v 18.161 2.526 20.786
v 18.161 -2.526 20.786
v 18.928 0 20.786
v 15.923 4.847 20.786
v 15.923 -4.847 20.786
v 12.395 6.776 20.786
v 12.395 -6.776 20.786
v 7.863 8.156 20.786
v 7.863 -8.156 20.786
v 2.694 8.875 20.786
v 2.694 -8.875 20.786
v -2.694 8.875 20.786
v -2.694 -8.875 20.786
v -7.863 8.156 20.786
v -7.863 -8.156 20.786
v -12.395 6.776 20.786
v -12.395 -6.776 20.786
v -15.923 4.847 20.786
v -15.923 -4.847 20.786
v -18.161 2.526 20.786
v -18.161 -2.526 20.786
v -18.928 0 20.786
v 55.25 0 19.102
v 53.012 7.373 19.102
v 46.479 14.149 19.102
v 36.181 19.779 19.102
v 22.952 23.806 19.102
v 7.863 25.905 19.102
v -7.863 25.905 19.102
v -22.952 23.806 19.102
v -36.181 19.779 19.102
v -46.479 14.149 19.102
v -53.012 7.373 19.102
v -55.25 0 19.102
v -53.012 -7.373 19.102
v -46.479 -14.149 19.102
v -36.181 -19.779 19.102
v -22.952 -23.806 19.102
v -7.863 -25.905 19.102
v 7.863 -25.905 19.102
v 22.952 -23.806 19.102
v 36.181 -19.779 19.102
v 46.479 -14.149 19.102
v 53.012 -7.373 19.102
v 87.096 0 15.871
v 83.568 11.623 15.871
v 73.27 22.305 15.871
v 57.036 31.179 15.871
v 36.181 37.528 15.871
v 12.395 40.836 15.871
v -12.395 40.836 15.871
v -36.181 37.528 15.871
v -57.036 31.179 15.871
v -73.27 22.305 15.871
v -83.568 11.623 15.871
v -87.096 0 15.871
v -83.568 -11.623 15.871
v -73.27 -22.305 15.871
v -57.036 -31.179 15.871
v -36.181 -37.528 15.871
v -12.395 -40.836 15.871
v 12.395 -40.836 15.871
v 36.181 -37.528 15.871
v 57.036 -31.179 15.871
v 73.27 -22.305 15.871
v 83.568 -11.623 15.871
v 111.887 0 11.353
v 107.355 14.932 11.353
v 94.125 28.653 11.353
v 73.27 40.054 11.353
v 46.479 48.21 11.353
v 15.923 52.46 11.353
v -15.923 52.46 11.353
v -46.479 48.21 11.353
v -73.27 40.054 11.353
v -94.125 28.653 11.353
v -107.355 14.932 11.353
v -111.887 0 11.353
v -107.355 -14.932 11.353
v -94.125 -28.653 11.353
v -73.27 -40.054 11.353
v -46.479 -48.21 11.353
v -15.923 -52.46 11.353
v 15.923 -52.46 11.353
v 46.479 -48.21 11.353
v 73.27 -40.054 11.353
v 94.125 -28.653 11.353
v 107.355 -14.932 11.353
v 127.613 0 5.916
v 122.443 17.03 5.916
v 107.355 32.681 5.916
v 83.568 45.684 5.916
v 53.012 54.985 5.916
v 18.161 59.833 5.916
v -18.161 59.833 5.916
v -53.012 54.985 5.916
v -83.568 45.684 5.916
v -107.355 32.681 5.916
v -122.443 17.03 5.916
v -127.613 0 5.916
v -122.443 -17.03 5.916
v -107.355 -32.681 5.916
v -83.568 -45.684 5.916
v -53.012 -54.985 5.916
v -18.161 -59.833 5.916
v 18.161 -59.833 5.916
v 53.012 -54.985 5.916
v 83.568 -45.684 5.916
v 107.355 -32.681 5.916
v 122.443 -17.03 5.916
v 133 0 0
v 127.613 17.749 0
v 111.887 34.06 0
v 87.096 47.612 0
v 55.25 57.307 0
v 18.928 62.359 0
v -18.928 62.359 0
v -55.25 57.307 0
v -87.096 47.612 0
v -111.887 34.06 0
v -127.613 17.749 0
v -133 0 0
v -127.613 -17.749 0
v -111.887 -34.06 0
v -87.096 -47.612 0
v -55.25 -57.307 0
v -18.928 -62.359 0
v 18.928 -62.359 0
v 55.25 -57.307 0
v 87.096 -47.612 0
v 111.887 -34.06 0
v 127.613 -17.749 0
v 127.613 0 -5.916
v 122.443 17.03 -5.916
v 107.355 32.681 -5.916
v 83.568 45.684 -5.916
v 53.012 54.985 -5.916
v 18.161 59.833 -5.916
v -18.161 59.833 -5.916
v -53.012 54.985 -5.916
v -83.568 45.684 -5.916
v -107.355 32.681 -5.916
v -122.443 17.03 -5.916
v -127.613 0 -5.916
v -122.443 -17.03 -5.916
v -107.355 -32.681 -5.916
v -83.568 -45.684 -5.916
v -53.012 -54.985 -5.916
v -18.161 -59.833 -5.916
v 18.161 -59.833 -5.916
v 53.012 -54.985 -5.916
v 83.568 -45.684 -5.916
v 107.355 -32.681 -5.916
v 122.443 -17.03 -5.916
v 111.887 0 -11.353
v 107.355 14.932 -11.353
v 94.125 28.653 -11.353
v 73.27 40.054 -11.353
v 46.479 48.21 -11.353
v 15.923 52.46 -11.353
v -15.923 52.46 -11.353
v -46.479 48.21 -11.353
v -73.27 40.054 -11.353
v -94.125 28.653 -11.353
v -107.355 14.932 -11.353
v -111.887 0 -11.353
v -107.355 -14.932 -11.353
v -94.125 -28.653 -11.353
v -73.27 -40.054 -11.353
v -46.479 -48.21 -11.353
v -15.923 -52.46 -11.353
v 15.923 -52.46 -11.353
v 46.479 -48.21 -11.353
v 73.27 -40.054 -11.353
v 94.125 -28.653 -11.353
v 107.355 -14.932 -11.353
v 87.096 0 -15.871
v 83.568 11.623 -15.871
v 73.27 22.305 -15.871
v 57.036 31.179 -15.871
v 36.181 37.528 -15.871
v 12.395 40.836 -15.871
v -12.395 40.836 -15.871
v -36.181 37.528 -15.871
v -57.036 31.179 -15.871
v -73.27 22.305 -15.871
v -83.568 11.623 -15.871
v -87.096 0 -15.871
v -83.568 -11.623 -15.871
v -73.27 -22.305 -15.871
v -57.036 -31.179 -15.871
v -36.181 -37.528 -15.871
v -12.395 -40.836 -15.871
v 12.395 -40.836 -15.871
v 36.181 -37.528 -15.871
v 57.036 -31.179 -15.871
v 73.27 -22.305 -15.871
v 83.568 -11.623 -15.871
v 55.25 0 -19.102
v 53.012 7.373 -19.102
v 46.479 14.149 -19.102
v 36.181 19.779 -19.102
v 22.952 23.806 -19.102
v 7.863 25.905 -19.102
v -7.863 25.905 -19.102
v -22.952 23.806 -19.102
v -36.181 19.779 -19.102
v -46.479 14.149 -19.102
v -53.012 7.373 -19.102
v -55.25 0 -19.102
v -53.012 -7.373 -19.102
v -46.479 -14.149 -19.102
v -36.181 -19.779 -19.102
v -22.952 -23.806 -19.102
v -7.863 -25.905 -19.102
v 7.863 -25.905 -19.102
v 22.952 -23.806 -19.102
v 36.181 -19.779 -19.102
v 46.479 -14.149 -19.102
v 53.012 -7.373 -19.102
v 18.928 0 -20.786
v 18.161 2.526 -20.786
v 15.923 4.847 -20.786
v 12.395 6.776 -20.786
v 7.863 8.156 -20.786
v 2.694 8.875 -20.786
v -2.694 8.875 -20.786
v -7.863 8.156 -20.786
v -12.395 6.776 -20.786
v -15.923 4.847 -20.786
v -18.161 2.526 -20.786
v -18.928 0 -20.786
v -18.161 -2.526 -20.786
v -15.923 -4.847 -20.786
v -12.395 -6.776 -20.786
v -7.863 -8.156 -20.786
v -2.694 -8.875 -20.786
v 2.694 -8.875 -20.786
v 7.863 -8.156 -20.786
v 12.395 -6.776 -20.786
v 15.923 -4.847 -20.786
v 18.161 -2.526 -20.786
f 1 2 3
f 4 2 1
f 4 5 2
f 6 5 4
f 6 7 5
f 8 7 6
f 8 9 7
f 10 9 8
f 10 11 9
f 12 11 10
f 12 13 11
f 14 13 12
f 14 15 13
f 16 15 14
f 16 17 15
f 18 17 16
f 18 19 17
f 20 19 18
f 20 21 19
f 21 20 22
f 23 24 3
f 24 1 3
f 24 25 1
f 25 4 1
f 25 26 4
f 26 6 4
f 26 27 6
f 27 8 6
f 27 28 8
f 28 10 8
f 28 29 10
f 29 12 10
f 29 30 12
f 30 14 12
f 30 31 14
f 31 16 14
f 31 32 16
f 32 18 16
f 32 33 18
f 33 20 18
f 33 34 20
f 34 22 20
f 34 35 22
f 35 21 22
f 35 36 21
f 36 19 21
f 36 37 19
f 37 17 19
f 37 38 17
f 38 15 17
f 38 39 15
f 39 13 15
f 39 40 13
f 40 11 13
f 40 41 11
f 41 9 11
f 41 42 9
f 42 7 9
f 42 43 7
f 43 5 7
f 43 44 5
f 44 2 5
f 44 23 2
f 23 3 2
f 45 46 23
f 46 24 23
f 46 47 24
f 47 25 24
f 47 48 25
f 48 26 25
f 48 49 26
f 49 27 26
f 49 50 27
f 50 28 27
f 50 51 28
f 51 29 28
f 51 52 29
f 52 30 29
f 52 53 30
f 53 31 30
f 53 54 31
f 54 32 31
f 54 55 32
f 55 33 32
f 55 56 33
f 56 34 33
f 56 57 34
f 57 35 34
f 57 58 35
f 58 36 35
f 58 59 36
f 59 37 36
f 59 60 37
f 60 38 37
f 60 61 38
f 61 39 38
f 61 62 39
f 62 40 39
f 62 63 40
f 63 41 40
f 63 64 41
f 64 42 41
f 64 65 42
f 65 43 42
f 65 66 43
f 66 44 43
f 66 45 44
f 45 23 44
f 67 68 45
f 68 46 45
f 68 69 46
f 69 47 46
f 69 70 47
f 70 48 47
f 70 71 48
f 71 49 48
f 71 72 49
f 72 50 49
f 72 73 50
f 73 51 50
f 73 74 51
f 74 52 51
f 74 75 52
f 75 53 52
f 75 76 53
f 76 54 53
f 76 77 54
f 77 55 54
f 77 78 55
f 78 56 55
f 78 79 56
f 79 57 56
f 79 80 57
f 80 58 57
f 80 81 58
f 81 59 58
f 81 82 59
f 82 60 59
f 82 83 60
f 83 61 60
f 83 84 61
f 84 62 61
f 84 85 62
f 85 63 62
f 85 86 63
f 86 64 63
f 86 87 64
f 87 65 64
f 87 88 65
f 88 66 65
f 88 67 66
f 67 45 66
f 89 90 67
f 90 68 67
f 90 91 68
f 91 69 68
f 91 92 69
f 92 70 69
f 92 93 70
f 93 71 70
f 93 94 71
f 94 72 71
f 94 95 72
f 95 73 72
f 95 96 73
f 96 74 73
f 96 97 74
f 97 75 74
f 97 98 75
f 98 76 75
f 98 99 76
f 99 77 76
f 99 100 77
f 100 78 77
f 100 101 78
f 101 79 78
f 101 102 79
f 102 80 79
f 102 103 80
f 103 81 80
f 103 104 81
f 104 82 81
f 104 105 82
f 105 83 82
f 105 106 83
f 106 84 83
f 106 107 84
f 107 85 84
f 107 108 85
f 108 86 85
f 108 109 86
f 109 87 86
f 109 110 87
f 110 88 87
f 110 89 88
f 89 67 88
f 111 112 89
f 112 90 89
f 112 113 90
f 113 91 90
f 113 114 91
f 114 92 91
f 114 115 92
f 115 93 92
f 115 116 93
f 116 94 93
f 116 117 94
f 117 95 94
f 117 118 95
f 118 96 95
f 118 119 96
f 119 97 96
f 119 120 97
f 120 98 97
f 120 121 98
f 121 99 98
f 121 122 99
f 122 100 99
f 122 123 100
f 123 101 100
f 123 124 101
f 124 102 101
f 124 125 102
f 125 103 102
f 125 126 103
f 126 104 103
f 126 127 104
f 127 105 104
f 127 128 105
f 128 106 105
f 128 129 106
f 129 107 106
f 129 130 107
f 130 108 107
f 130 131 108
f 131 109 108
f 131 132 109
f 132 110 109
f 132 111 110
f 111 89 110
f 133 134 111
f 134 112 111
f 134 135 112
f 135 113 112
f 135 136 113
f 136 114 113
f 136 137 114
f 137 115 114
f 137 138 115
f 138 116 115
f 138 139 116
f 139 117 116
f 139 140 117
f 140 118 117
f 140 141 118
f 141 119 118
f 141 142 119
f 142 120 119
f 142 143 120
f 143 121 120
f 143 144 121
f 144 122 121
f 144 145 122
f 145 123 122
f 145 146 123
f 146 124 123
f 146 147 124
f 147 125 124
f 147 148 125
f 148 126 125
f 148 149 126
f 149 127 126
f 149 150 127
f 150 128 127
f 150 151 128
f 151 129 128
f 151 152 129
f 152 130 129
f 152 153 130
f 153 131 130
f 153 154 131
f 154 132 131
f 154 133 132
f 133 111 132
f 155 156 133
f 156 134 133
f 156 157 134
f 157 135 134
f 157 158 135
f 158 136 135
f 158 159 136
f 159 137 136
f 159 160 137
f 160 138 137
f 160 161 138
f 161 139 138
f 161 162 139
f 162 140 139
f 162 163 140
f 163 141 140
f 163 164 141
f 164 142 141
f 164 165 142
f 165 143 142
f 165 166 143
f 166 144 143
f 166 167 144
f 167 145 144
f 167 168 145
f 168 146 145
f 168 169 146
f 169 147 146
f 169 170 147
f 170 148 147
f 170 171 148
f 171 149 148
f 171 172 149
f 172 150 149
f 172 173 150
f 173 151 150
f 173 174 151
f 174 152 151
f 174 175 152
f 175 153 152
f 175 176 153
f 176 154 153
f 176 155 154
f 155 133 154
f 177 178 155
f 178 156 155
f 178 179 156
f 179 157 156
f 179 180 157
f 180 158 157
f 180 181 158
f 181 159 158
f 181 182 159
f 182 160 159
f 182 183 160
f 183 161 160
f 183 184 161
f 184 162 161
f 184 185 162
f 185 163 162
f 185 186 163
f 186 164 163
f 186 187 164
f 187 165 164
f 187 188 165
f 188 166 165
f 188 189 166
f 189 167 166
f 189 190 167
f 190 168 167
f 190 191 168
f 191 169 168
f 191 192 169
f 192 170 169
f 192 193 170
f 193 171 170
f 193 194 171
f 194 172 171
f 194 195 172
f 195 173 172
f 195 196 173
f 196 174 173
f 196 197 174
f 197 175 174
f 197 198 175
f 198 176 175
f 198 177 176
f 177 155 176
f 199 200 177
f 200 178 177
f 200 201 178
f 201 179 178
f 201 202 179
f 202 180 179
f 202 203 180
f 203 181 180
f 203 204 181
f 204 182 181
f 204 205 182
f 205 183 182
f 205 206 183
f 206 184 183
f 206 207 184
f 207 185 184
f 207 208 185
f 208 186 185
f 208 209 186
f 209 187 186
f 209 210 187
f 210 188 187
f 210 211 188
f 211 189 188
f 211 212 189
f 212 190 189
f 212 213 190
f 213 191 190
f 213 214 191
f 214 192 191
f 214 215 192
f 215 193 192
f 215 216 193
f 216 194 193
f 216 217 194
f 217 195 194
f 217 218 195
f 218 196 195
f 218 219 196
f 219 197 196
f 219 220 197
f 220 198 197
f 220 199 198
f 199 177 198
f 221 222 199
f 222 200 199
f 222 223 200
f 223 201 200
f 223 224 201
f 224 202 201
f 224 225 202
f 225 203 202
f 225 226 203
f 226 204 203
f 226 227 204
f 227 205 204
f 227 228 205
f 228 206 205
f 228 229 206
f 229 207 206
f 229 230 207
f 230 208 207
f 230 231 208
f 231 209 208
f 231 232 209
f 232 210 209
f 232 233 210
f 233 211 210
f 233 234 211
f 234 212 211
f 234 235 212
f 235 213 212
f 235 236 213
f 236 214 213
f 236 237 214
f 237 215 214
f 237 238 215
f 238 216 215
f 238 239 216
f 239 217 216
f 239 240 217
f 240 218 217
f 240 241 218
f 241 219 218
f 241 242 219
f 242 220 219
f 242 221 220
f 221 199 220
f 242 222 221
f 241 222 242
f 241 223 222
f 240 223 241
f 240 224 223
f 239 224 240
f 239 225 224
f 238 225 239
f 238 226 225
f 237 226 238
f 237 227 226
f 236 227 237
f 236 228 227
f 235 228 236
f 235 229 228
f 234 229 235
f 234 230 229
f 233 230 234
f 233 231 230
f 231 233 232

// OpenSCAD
// Generated by SolidPython 1.0.1 on 2020-07-29 00:46:53


scale(v = [19, 9, 3]) {
	sphere(r = 7);
}
/***********************************************
*********      SolidPython code:      **********
************************************************
 
# import packages: SolidPython
from solid import *
from solid.utils import *
from itertools import chain, combinations, permutations


class Resize:

    def __init__(self, scad_file):
        self.scad_file = scad_file
        #self.scad_file = import_scad(scad_file)
        # cone/cylinder param:
        self.r1 = 0
        self.r2 = 0
        self.h = 0
        # rectangular prism param:
        self.w = 0
        self.l = 0
        # ellipse param:
        self.r = 0

    # import OpenScad code (file name corresponds to shape)


    # classify shape + parameters
    def assign(self, param1, param2, param3):
        if self.scad_file == 'cone.scad':
            self.r1 = param1
            self.r2 = param2
            self.h = param3
        elif self.scad_file == 'cylinder.scad':
            self.r1 = param1
            self.r2 = param2
            self.h = param3
        elif self.scad_file == 'rectangularPrism.scad':
            self.h = param1
            self.l = param2
            self.w = param3
        else:
            self.r = param1
            self.h = param2

    # resize parameters
    def iterate(self):
        x = range(3, 20, 2)
        i = 1
        if self.scad_file == 'cone.scad':
            tempList = list(permutations(x, 2))
            for temp in tempList:
                param1 = temp[0]
                param2 = temp[1]
                filepath = 'produced_scad_files/' + 'cone' + str(param1) + '_' + str(param2) + '_' + '.scad'
                scad_render_to_file(cylinder(h=param1, r1=param2, r2=0), filepath)

        elif self.scad_file == 'cylinder.scad':
            tempList = list(permutations(x, 3))
            for temp in tempList:
                param1 = temp[0]
                param2 = temp[1]
                filepath = 'produced_scad_files/' + 'cylinder' + str(param1) + '_' + str(param2) + '_' + '.scad'
                scad_render_to_file(cylinder(h=param1, r1=param2, r2=param2), filepath)

        elif self.scad_file == 'rectangularPrism.scad':
            tempList = list(permutations(x, 3))
            for temp in tempList:
                param1 = temp[0]
                param2 = temp[1]
                param3 = temp[2]
                filepath = 'produced_scad_files/' + 'rectangularPrism' + str(param1) + '_' + str(param2) + '_' + str(
                    param3) + '.scad'
                scad_render_to_file(cube(size=(param1, param2, param3)), filepath)

        elif self.scad_file == 'ellipse.scad':
            tempList = list(permutations(x, 4))
            for temp in tempList:
                param1 = temp[0]
                param2 = temp[1]
                param3 = temp[2]
                param4 = temp[3]
                filepath = 'produced_scad_files/' + 'ellipse' + str(param1) + '_' + str(param2) + '_' + str(param3) + '_' + str(param4) + '.scad'
                scad_render_to_file(scale([param1, param2, param3])(sphere(r=param4)), filepath)

    def render_to_scadfile(self):
        scad_render_to_file(scad, 'example.scad') 
 
************************************************/
